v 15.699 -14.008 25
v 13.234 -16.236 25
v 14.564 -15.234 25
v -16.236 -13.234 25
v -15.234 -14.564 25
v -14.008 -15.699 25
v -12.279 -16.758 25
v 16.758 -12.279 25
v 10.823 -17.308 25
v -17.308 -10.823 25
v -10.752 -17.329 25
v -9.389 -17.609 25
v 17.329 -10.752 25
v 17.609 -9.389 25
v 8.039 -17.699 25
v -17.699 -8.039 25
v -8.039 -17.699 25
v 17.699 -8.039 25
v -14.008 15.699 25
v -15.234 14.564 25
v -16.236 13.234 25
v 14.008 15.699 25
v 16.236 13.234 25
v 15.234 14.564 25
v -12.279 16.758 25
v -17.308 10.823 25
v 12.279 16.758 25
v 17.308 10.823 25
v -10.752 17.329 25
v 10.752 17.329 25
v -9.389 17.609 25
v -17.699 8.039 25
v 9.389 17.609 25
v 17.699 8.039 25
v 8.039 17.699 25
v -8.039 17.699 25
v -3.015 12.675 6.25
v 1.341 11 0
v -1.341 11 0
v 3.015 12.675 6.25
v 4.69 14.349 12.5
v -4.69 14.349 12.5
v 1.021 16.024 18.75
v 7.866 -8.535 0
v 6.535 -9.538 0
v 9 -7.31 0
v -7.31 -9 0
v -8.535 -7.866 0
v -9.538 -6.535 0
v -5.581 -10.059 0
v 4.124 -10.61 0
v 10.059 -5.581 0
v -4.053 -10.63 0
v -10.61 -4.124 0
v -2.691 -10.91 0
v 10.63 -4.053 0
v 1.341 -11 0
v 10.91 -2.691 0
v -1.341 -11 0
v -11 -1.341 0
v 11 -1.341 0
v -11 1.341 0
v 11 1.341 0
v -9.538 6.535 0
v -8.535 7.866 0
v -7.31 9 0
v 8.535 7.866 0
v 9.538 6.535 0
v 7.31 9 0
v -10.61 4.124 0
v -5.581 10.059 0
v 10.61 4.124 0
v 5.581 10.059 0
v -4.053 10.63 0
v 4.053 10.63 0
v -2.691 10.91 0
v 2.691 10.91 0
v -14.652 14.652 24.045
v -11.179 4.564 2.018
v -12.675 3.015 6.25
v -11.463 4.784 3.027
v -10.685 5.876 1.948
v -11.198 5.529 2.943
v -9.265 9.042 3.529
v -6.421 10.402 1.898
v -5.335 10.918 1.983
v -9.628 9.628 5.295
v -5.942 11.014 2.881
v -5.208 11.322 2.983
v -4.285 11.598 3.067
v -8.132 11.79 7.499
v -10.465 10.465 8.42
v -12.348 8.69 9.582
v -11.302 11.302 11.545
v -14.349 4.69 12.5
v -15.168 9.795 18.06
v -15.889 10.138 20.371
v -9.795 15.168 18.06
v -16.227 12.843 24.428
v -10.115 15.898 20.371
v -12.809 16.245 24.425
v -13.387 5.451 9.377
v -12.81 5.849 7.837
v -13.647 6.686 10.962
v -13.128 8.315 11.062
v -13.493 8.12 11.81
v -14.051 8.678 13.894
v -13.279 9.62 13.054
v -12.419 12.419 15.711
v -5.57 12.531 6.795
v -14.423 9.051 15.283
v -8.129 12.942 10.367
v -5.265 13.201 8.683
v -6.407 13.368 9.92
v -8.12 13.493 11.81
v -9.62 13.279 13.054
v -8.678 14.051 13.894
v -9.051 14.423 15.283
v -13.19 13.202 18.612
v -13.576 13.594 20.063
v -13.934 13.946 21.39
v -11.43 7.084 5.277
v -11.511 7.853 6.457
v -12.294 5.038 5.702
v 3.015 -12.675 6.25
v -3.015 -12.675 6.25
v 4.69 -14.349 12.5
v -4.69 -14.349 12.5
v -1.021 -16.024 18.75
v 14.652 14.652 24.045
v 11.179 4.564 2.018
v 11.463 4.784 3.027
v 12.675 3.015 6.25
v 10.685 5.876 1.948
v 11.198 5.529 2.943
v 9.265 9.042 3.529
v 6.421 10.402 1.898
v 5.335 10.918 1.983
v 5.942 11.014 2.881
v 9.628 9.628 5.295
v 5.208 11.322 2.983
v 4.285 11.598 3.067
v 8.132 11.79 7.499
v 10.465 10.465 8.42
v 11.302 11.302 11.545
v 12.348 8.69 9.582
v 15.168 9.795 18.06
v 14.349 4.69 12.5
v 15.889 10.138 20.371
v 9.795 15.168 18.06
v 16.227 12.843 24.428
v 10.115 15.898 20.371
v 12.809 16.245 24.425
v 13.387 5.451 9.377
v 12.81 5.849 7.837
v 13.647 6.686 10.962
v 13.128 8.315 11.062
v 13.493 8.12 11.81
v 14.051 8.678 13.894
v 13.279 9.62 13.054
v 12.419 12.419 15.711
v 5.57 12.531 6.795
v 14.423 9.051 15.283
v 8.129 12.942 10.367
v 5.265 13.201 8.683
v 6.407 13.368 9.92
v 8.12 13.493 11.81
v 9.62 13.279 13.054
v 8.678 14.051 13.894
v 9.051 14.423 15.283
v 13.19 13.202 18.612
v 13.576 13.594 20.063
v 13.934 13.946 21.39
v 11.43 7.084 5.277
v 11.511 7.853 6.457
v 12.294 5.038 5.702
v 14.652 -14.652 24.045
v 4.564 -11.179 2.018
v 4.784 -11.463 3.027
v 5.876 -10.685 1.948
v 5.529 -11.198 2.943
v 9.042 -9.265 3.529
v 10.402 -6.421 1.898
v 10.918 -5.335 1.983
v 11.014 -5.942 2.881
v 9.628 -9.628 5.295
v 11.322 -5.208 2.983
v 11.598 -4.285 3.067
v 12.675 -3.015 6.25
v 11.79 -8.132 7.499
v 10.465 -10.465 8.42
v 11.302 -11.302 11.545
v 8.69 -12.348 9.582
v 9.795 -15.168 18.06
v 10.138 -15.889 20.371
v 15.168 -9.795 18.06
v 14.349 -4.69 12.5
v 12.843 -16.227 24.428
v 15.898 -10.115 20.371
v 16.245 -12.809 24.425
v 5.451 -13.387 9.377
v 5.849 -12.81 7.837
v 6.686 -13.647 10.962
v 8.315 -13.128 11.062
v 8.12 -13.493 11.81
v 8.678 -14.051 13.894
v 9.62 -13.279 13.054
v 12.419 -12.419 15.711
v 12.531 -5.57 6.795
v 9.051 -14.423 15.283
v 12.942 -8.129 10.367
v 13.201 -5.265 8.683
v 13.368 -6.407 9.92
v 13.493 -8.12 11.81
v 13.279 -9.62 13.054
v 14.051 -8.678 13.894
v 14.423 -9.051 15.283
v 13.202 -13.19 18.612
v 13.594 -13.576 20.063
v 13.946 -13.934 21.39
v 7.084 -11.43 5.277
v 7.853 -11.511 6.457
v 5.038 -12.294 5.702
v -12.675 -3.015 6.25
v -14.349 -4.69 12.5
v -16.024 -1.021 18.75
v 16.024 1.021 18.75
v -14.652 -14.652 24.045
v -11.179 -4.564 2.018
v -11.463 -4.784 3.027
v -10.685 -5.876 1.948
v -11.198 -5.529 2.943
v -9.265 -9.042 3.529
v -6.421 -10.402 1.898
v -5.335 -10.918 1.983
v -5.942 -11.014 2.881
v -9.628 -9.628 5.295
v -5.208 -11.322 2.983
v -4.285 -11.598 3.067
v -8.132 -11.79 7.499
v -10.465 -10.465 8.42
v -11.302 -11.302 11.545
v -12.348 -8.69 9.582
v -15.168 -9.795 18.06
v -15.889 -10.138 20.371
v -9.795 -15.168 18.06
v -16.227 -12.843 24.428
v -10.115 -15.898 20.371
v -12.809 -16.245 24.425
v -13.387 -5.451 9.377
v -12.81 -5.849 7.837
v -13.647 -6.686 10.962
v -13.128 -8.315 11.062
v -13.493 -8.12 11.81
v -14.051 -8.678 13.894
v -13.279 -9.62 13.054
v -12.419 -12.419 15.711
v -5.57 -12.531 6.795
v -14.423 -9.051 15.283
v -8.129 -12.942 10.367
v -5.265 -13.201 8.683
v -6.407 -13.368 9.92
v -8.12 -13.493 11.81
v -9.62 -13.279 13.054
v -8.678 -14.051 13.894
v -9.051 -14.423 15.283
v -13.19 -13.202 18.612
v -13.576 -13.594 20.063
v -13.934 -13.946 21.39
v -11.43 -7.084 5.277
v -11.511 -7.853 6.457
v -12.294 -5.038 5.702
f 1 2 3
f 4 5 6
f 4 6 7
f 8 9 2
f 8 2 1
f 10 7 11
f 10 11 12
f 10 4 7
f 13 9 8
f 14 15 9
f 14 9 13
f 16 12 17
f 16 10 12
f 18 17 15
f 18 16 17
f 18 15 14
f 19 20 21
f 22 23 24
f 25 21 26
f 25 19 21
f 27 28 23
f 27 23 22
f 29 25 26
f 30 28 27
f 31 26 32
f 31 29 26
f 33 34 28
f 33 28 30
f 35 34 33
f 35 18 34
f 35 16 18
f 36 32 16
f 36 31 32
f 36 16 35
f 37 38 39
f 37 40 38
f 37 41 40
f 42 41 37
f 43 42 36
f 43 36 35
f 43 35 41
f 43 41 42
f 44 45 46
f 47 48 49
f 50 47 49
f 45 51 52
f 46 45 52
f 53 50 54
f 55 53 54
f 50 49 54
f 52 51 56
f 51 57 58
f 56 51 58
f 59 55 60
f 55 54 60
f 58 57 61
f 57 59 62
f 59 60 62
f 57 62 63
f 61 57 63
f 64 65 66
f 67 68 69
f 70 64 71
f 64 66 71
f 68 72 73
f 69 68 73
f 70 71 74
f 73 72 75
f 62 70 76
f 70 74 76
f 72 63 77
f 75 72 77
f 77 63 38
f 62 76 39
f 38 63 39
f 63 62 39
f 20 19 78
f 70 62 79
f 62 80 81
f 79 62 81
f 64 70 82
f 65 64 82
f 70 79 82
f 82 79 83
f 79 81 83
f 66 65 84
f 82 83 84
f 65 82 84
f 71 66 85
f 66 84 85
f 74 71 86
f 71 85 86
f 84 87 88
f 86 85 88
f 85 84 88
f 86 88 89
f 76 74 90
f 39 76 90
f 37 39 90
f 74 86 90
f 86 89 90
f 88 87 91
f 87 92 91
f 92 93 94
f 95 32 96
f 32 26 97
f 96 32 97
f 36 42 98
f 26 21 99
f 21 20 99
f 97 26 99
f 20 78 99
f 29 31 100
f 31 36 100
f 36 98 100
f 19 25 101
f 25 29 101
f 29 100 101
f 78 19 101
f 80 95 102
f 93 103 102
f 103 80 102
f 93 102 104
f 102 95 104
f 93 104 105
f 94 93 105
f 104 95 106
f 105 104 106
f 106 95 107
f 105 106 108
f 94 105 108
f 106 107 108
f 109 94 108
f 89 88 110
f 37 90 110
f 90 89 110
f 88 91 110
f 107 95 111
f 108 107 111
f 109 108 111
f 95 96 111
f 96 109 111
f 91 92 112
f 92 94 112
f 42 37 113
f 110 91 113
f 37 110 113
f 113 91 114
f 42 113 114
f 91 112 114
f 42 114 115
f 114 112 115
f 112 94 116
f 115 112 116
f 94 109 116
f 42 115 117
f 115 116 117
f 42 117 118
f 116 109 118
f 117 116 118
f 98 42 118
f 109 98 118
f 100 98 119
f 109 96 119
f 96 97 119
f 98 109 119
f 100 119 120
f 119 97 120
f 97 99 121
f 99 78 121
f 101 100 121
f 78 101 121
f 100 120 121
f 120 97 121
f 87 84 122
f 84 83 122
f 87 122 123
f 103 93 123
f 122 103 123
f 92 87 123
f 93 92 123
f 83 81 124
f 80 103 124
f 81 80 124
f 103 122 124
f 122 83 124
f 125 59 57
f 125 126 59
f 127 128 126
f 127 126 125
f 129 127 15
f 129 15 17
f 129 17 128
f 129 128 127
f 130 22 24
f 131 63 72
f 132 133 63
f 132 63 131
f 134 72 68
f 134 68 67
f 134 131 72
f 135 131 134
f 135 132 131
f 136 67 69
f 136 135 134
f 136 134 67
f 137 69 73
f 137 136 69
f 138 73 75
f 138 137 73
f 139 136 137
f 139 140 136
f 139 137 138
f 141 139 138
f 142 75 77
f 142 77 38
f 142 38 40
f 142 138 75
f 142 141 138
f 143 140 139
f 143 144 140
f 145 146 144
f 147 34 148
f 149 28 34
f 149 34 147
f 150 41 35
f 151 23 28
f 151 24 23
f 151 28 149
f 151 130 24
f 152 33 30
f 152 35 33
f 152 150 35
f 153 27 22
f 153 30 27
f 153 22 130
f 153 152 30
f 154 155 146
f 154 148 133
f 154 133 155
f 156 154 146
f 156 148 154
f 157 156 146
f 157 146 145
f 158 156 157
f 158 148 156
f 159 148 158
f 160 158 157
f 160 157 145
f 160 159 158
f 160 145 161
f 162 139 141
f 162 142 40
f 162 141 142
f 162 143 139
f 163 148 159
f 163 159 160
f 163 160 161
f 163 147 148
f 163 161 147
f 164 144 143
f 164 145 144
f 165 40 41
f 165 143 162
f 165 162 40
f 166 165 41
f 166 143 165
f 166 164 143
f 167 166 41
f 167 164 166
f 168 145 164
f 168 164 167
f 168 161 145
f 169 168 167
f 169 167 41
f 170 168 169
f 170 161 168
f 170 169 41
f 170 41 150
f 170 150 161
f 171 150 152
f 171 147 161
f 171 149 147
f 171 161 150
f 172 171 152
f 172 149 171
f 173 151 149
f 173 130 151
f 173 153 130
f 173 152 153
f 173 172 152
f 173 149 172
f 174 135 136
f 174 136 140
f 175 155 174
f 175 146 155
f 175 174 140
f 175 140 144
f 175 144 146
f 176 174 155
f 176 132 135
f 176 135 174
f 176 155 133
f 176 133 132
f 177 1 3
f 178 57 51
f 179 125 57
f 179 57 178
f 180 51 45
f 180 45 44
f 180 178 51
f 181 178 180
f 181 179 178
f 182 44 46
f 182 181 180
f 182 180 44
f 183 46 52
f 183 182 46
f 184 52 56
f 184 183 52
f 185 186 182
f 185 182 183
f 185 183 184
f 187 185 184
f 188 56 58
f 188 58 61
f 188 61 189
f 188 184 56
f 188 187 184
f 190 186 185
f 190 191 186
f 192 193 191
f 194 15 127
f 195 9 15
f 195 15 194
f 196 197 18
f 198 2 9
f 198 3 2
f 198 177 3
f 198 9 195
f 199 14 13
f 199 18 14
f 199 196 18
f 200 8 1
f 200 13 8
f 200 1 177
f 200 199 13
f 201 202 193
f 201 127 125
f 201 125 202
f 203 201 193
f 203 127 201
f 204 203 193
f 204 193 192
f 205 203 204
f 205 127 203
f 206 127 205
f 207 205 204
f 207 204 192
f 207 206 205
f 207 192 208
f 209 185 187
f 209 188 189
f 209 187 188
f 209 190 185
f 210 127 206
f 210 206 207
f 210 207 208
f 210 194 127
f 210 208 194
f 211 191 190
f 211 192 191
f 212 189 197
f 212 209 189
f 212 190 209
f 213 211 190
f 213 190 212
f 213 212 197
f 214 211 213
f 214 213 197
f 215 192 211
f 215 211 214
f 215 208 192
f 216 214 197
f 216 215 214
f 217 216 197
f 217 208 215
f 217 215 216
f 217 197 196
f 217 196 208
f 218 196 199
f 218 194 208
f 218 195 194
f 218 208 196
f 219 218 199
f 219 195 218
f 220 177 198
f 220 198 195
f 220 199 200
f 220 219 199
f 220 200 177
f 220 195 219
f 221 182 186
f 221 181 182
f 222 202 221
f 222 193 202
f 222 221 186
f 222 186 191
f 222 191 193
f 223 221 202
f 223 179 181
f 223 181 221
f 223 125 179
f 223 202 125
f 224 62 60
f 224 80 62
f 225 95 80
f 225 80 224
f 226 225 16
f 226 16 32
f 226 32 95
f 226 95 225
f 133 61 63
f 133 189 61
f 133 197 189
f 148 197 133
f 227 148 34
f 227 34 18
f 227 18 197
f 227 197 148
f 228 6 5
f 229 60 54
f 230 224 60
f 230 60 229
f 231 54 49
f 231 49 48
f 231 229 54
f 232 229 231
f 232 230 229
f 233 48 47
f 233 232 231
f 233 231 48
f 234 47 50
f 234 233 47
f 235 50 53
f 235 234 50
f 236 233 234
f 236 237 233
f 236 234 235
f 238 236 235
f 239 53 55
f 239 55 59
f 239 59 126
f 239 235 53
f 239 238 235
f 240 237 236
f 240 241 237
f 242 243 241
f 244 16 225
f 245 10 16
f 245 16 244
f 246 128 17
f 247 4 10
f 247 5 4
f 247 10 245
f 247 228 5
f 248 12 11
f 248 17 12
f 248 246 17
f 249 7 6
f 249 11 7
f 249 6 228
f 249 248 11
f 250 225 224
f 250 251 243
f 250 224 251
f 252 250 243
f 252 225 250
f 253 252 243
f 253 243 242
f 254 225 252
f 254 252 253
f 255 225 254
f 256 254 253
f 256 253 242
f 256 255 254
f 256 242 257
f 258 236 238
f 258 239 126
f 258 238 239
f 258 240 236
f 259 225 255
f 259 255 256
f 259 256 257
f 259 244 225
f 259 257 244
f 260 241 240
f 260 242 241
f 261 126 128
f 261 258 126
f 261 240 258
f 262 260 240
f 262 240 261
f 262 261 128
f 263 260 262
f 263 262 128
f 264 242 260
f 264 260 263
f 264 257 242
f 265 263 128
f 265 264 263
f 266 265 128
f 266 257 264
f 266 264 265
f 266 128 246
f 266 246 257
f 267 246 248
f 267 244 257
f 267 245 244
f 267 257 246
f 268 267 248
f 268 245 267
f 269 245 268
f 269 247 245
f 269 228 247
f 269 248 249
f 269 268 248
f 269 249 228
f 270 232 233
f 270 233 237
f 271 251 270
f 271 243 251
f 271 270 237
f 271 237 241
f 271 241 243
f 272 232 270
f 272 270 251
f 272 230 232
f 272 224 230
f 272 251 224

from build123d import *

# Parameters (mm, degrees)
F0_W     = 22
F0_H     = 22
F1_DEPTH = 25
F1_TAPER = -15
F2_R     = 10


with BuildPart() as f1:
    # F0 (on Top) → F1 (new body)
    with BuildSketch(Plane.XY):
        Rectangle(F0_W, F0_H)
    extrude(amount=F1_DEPTH, taper=F1_TAPER)

    # F2
    f2_edges = [f1.edges().sort_by_distance(p)[0] for p in [
        (-14.349365, -14.349365, 12.5),
        (-14.349365, 14.349365, 12.5),
        (14.349365, 14.349365, 12.5),
        (14.349365, -14.349365, 12.5),
    ]]
    fillet(f2_edges, radius=F2_R)


solid = f1.part
